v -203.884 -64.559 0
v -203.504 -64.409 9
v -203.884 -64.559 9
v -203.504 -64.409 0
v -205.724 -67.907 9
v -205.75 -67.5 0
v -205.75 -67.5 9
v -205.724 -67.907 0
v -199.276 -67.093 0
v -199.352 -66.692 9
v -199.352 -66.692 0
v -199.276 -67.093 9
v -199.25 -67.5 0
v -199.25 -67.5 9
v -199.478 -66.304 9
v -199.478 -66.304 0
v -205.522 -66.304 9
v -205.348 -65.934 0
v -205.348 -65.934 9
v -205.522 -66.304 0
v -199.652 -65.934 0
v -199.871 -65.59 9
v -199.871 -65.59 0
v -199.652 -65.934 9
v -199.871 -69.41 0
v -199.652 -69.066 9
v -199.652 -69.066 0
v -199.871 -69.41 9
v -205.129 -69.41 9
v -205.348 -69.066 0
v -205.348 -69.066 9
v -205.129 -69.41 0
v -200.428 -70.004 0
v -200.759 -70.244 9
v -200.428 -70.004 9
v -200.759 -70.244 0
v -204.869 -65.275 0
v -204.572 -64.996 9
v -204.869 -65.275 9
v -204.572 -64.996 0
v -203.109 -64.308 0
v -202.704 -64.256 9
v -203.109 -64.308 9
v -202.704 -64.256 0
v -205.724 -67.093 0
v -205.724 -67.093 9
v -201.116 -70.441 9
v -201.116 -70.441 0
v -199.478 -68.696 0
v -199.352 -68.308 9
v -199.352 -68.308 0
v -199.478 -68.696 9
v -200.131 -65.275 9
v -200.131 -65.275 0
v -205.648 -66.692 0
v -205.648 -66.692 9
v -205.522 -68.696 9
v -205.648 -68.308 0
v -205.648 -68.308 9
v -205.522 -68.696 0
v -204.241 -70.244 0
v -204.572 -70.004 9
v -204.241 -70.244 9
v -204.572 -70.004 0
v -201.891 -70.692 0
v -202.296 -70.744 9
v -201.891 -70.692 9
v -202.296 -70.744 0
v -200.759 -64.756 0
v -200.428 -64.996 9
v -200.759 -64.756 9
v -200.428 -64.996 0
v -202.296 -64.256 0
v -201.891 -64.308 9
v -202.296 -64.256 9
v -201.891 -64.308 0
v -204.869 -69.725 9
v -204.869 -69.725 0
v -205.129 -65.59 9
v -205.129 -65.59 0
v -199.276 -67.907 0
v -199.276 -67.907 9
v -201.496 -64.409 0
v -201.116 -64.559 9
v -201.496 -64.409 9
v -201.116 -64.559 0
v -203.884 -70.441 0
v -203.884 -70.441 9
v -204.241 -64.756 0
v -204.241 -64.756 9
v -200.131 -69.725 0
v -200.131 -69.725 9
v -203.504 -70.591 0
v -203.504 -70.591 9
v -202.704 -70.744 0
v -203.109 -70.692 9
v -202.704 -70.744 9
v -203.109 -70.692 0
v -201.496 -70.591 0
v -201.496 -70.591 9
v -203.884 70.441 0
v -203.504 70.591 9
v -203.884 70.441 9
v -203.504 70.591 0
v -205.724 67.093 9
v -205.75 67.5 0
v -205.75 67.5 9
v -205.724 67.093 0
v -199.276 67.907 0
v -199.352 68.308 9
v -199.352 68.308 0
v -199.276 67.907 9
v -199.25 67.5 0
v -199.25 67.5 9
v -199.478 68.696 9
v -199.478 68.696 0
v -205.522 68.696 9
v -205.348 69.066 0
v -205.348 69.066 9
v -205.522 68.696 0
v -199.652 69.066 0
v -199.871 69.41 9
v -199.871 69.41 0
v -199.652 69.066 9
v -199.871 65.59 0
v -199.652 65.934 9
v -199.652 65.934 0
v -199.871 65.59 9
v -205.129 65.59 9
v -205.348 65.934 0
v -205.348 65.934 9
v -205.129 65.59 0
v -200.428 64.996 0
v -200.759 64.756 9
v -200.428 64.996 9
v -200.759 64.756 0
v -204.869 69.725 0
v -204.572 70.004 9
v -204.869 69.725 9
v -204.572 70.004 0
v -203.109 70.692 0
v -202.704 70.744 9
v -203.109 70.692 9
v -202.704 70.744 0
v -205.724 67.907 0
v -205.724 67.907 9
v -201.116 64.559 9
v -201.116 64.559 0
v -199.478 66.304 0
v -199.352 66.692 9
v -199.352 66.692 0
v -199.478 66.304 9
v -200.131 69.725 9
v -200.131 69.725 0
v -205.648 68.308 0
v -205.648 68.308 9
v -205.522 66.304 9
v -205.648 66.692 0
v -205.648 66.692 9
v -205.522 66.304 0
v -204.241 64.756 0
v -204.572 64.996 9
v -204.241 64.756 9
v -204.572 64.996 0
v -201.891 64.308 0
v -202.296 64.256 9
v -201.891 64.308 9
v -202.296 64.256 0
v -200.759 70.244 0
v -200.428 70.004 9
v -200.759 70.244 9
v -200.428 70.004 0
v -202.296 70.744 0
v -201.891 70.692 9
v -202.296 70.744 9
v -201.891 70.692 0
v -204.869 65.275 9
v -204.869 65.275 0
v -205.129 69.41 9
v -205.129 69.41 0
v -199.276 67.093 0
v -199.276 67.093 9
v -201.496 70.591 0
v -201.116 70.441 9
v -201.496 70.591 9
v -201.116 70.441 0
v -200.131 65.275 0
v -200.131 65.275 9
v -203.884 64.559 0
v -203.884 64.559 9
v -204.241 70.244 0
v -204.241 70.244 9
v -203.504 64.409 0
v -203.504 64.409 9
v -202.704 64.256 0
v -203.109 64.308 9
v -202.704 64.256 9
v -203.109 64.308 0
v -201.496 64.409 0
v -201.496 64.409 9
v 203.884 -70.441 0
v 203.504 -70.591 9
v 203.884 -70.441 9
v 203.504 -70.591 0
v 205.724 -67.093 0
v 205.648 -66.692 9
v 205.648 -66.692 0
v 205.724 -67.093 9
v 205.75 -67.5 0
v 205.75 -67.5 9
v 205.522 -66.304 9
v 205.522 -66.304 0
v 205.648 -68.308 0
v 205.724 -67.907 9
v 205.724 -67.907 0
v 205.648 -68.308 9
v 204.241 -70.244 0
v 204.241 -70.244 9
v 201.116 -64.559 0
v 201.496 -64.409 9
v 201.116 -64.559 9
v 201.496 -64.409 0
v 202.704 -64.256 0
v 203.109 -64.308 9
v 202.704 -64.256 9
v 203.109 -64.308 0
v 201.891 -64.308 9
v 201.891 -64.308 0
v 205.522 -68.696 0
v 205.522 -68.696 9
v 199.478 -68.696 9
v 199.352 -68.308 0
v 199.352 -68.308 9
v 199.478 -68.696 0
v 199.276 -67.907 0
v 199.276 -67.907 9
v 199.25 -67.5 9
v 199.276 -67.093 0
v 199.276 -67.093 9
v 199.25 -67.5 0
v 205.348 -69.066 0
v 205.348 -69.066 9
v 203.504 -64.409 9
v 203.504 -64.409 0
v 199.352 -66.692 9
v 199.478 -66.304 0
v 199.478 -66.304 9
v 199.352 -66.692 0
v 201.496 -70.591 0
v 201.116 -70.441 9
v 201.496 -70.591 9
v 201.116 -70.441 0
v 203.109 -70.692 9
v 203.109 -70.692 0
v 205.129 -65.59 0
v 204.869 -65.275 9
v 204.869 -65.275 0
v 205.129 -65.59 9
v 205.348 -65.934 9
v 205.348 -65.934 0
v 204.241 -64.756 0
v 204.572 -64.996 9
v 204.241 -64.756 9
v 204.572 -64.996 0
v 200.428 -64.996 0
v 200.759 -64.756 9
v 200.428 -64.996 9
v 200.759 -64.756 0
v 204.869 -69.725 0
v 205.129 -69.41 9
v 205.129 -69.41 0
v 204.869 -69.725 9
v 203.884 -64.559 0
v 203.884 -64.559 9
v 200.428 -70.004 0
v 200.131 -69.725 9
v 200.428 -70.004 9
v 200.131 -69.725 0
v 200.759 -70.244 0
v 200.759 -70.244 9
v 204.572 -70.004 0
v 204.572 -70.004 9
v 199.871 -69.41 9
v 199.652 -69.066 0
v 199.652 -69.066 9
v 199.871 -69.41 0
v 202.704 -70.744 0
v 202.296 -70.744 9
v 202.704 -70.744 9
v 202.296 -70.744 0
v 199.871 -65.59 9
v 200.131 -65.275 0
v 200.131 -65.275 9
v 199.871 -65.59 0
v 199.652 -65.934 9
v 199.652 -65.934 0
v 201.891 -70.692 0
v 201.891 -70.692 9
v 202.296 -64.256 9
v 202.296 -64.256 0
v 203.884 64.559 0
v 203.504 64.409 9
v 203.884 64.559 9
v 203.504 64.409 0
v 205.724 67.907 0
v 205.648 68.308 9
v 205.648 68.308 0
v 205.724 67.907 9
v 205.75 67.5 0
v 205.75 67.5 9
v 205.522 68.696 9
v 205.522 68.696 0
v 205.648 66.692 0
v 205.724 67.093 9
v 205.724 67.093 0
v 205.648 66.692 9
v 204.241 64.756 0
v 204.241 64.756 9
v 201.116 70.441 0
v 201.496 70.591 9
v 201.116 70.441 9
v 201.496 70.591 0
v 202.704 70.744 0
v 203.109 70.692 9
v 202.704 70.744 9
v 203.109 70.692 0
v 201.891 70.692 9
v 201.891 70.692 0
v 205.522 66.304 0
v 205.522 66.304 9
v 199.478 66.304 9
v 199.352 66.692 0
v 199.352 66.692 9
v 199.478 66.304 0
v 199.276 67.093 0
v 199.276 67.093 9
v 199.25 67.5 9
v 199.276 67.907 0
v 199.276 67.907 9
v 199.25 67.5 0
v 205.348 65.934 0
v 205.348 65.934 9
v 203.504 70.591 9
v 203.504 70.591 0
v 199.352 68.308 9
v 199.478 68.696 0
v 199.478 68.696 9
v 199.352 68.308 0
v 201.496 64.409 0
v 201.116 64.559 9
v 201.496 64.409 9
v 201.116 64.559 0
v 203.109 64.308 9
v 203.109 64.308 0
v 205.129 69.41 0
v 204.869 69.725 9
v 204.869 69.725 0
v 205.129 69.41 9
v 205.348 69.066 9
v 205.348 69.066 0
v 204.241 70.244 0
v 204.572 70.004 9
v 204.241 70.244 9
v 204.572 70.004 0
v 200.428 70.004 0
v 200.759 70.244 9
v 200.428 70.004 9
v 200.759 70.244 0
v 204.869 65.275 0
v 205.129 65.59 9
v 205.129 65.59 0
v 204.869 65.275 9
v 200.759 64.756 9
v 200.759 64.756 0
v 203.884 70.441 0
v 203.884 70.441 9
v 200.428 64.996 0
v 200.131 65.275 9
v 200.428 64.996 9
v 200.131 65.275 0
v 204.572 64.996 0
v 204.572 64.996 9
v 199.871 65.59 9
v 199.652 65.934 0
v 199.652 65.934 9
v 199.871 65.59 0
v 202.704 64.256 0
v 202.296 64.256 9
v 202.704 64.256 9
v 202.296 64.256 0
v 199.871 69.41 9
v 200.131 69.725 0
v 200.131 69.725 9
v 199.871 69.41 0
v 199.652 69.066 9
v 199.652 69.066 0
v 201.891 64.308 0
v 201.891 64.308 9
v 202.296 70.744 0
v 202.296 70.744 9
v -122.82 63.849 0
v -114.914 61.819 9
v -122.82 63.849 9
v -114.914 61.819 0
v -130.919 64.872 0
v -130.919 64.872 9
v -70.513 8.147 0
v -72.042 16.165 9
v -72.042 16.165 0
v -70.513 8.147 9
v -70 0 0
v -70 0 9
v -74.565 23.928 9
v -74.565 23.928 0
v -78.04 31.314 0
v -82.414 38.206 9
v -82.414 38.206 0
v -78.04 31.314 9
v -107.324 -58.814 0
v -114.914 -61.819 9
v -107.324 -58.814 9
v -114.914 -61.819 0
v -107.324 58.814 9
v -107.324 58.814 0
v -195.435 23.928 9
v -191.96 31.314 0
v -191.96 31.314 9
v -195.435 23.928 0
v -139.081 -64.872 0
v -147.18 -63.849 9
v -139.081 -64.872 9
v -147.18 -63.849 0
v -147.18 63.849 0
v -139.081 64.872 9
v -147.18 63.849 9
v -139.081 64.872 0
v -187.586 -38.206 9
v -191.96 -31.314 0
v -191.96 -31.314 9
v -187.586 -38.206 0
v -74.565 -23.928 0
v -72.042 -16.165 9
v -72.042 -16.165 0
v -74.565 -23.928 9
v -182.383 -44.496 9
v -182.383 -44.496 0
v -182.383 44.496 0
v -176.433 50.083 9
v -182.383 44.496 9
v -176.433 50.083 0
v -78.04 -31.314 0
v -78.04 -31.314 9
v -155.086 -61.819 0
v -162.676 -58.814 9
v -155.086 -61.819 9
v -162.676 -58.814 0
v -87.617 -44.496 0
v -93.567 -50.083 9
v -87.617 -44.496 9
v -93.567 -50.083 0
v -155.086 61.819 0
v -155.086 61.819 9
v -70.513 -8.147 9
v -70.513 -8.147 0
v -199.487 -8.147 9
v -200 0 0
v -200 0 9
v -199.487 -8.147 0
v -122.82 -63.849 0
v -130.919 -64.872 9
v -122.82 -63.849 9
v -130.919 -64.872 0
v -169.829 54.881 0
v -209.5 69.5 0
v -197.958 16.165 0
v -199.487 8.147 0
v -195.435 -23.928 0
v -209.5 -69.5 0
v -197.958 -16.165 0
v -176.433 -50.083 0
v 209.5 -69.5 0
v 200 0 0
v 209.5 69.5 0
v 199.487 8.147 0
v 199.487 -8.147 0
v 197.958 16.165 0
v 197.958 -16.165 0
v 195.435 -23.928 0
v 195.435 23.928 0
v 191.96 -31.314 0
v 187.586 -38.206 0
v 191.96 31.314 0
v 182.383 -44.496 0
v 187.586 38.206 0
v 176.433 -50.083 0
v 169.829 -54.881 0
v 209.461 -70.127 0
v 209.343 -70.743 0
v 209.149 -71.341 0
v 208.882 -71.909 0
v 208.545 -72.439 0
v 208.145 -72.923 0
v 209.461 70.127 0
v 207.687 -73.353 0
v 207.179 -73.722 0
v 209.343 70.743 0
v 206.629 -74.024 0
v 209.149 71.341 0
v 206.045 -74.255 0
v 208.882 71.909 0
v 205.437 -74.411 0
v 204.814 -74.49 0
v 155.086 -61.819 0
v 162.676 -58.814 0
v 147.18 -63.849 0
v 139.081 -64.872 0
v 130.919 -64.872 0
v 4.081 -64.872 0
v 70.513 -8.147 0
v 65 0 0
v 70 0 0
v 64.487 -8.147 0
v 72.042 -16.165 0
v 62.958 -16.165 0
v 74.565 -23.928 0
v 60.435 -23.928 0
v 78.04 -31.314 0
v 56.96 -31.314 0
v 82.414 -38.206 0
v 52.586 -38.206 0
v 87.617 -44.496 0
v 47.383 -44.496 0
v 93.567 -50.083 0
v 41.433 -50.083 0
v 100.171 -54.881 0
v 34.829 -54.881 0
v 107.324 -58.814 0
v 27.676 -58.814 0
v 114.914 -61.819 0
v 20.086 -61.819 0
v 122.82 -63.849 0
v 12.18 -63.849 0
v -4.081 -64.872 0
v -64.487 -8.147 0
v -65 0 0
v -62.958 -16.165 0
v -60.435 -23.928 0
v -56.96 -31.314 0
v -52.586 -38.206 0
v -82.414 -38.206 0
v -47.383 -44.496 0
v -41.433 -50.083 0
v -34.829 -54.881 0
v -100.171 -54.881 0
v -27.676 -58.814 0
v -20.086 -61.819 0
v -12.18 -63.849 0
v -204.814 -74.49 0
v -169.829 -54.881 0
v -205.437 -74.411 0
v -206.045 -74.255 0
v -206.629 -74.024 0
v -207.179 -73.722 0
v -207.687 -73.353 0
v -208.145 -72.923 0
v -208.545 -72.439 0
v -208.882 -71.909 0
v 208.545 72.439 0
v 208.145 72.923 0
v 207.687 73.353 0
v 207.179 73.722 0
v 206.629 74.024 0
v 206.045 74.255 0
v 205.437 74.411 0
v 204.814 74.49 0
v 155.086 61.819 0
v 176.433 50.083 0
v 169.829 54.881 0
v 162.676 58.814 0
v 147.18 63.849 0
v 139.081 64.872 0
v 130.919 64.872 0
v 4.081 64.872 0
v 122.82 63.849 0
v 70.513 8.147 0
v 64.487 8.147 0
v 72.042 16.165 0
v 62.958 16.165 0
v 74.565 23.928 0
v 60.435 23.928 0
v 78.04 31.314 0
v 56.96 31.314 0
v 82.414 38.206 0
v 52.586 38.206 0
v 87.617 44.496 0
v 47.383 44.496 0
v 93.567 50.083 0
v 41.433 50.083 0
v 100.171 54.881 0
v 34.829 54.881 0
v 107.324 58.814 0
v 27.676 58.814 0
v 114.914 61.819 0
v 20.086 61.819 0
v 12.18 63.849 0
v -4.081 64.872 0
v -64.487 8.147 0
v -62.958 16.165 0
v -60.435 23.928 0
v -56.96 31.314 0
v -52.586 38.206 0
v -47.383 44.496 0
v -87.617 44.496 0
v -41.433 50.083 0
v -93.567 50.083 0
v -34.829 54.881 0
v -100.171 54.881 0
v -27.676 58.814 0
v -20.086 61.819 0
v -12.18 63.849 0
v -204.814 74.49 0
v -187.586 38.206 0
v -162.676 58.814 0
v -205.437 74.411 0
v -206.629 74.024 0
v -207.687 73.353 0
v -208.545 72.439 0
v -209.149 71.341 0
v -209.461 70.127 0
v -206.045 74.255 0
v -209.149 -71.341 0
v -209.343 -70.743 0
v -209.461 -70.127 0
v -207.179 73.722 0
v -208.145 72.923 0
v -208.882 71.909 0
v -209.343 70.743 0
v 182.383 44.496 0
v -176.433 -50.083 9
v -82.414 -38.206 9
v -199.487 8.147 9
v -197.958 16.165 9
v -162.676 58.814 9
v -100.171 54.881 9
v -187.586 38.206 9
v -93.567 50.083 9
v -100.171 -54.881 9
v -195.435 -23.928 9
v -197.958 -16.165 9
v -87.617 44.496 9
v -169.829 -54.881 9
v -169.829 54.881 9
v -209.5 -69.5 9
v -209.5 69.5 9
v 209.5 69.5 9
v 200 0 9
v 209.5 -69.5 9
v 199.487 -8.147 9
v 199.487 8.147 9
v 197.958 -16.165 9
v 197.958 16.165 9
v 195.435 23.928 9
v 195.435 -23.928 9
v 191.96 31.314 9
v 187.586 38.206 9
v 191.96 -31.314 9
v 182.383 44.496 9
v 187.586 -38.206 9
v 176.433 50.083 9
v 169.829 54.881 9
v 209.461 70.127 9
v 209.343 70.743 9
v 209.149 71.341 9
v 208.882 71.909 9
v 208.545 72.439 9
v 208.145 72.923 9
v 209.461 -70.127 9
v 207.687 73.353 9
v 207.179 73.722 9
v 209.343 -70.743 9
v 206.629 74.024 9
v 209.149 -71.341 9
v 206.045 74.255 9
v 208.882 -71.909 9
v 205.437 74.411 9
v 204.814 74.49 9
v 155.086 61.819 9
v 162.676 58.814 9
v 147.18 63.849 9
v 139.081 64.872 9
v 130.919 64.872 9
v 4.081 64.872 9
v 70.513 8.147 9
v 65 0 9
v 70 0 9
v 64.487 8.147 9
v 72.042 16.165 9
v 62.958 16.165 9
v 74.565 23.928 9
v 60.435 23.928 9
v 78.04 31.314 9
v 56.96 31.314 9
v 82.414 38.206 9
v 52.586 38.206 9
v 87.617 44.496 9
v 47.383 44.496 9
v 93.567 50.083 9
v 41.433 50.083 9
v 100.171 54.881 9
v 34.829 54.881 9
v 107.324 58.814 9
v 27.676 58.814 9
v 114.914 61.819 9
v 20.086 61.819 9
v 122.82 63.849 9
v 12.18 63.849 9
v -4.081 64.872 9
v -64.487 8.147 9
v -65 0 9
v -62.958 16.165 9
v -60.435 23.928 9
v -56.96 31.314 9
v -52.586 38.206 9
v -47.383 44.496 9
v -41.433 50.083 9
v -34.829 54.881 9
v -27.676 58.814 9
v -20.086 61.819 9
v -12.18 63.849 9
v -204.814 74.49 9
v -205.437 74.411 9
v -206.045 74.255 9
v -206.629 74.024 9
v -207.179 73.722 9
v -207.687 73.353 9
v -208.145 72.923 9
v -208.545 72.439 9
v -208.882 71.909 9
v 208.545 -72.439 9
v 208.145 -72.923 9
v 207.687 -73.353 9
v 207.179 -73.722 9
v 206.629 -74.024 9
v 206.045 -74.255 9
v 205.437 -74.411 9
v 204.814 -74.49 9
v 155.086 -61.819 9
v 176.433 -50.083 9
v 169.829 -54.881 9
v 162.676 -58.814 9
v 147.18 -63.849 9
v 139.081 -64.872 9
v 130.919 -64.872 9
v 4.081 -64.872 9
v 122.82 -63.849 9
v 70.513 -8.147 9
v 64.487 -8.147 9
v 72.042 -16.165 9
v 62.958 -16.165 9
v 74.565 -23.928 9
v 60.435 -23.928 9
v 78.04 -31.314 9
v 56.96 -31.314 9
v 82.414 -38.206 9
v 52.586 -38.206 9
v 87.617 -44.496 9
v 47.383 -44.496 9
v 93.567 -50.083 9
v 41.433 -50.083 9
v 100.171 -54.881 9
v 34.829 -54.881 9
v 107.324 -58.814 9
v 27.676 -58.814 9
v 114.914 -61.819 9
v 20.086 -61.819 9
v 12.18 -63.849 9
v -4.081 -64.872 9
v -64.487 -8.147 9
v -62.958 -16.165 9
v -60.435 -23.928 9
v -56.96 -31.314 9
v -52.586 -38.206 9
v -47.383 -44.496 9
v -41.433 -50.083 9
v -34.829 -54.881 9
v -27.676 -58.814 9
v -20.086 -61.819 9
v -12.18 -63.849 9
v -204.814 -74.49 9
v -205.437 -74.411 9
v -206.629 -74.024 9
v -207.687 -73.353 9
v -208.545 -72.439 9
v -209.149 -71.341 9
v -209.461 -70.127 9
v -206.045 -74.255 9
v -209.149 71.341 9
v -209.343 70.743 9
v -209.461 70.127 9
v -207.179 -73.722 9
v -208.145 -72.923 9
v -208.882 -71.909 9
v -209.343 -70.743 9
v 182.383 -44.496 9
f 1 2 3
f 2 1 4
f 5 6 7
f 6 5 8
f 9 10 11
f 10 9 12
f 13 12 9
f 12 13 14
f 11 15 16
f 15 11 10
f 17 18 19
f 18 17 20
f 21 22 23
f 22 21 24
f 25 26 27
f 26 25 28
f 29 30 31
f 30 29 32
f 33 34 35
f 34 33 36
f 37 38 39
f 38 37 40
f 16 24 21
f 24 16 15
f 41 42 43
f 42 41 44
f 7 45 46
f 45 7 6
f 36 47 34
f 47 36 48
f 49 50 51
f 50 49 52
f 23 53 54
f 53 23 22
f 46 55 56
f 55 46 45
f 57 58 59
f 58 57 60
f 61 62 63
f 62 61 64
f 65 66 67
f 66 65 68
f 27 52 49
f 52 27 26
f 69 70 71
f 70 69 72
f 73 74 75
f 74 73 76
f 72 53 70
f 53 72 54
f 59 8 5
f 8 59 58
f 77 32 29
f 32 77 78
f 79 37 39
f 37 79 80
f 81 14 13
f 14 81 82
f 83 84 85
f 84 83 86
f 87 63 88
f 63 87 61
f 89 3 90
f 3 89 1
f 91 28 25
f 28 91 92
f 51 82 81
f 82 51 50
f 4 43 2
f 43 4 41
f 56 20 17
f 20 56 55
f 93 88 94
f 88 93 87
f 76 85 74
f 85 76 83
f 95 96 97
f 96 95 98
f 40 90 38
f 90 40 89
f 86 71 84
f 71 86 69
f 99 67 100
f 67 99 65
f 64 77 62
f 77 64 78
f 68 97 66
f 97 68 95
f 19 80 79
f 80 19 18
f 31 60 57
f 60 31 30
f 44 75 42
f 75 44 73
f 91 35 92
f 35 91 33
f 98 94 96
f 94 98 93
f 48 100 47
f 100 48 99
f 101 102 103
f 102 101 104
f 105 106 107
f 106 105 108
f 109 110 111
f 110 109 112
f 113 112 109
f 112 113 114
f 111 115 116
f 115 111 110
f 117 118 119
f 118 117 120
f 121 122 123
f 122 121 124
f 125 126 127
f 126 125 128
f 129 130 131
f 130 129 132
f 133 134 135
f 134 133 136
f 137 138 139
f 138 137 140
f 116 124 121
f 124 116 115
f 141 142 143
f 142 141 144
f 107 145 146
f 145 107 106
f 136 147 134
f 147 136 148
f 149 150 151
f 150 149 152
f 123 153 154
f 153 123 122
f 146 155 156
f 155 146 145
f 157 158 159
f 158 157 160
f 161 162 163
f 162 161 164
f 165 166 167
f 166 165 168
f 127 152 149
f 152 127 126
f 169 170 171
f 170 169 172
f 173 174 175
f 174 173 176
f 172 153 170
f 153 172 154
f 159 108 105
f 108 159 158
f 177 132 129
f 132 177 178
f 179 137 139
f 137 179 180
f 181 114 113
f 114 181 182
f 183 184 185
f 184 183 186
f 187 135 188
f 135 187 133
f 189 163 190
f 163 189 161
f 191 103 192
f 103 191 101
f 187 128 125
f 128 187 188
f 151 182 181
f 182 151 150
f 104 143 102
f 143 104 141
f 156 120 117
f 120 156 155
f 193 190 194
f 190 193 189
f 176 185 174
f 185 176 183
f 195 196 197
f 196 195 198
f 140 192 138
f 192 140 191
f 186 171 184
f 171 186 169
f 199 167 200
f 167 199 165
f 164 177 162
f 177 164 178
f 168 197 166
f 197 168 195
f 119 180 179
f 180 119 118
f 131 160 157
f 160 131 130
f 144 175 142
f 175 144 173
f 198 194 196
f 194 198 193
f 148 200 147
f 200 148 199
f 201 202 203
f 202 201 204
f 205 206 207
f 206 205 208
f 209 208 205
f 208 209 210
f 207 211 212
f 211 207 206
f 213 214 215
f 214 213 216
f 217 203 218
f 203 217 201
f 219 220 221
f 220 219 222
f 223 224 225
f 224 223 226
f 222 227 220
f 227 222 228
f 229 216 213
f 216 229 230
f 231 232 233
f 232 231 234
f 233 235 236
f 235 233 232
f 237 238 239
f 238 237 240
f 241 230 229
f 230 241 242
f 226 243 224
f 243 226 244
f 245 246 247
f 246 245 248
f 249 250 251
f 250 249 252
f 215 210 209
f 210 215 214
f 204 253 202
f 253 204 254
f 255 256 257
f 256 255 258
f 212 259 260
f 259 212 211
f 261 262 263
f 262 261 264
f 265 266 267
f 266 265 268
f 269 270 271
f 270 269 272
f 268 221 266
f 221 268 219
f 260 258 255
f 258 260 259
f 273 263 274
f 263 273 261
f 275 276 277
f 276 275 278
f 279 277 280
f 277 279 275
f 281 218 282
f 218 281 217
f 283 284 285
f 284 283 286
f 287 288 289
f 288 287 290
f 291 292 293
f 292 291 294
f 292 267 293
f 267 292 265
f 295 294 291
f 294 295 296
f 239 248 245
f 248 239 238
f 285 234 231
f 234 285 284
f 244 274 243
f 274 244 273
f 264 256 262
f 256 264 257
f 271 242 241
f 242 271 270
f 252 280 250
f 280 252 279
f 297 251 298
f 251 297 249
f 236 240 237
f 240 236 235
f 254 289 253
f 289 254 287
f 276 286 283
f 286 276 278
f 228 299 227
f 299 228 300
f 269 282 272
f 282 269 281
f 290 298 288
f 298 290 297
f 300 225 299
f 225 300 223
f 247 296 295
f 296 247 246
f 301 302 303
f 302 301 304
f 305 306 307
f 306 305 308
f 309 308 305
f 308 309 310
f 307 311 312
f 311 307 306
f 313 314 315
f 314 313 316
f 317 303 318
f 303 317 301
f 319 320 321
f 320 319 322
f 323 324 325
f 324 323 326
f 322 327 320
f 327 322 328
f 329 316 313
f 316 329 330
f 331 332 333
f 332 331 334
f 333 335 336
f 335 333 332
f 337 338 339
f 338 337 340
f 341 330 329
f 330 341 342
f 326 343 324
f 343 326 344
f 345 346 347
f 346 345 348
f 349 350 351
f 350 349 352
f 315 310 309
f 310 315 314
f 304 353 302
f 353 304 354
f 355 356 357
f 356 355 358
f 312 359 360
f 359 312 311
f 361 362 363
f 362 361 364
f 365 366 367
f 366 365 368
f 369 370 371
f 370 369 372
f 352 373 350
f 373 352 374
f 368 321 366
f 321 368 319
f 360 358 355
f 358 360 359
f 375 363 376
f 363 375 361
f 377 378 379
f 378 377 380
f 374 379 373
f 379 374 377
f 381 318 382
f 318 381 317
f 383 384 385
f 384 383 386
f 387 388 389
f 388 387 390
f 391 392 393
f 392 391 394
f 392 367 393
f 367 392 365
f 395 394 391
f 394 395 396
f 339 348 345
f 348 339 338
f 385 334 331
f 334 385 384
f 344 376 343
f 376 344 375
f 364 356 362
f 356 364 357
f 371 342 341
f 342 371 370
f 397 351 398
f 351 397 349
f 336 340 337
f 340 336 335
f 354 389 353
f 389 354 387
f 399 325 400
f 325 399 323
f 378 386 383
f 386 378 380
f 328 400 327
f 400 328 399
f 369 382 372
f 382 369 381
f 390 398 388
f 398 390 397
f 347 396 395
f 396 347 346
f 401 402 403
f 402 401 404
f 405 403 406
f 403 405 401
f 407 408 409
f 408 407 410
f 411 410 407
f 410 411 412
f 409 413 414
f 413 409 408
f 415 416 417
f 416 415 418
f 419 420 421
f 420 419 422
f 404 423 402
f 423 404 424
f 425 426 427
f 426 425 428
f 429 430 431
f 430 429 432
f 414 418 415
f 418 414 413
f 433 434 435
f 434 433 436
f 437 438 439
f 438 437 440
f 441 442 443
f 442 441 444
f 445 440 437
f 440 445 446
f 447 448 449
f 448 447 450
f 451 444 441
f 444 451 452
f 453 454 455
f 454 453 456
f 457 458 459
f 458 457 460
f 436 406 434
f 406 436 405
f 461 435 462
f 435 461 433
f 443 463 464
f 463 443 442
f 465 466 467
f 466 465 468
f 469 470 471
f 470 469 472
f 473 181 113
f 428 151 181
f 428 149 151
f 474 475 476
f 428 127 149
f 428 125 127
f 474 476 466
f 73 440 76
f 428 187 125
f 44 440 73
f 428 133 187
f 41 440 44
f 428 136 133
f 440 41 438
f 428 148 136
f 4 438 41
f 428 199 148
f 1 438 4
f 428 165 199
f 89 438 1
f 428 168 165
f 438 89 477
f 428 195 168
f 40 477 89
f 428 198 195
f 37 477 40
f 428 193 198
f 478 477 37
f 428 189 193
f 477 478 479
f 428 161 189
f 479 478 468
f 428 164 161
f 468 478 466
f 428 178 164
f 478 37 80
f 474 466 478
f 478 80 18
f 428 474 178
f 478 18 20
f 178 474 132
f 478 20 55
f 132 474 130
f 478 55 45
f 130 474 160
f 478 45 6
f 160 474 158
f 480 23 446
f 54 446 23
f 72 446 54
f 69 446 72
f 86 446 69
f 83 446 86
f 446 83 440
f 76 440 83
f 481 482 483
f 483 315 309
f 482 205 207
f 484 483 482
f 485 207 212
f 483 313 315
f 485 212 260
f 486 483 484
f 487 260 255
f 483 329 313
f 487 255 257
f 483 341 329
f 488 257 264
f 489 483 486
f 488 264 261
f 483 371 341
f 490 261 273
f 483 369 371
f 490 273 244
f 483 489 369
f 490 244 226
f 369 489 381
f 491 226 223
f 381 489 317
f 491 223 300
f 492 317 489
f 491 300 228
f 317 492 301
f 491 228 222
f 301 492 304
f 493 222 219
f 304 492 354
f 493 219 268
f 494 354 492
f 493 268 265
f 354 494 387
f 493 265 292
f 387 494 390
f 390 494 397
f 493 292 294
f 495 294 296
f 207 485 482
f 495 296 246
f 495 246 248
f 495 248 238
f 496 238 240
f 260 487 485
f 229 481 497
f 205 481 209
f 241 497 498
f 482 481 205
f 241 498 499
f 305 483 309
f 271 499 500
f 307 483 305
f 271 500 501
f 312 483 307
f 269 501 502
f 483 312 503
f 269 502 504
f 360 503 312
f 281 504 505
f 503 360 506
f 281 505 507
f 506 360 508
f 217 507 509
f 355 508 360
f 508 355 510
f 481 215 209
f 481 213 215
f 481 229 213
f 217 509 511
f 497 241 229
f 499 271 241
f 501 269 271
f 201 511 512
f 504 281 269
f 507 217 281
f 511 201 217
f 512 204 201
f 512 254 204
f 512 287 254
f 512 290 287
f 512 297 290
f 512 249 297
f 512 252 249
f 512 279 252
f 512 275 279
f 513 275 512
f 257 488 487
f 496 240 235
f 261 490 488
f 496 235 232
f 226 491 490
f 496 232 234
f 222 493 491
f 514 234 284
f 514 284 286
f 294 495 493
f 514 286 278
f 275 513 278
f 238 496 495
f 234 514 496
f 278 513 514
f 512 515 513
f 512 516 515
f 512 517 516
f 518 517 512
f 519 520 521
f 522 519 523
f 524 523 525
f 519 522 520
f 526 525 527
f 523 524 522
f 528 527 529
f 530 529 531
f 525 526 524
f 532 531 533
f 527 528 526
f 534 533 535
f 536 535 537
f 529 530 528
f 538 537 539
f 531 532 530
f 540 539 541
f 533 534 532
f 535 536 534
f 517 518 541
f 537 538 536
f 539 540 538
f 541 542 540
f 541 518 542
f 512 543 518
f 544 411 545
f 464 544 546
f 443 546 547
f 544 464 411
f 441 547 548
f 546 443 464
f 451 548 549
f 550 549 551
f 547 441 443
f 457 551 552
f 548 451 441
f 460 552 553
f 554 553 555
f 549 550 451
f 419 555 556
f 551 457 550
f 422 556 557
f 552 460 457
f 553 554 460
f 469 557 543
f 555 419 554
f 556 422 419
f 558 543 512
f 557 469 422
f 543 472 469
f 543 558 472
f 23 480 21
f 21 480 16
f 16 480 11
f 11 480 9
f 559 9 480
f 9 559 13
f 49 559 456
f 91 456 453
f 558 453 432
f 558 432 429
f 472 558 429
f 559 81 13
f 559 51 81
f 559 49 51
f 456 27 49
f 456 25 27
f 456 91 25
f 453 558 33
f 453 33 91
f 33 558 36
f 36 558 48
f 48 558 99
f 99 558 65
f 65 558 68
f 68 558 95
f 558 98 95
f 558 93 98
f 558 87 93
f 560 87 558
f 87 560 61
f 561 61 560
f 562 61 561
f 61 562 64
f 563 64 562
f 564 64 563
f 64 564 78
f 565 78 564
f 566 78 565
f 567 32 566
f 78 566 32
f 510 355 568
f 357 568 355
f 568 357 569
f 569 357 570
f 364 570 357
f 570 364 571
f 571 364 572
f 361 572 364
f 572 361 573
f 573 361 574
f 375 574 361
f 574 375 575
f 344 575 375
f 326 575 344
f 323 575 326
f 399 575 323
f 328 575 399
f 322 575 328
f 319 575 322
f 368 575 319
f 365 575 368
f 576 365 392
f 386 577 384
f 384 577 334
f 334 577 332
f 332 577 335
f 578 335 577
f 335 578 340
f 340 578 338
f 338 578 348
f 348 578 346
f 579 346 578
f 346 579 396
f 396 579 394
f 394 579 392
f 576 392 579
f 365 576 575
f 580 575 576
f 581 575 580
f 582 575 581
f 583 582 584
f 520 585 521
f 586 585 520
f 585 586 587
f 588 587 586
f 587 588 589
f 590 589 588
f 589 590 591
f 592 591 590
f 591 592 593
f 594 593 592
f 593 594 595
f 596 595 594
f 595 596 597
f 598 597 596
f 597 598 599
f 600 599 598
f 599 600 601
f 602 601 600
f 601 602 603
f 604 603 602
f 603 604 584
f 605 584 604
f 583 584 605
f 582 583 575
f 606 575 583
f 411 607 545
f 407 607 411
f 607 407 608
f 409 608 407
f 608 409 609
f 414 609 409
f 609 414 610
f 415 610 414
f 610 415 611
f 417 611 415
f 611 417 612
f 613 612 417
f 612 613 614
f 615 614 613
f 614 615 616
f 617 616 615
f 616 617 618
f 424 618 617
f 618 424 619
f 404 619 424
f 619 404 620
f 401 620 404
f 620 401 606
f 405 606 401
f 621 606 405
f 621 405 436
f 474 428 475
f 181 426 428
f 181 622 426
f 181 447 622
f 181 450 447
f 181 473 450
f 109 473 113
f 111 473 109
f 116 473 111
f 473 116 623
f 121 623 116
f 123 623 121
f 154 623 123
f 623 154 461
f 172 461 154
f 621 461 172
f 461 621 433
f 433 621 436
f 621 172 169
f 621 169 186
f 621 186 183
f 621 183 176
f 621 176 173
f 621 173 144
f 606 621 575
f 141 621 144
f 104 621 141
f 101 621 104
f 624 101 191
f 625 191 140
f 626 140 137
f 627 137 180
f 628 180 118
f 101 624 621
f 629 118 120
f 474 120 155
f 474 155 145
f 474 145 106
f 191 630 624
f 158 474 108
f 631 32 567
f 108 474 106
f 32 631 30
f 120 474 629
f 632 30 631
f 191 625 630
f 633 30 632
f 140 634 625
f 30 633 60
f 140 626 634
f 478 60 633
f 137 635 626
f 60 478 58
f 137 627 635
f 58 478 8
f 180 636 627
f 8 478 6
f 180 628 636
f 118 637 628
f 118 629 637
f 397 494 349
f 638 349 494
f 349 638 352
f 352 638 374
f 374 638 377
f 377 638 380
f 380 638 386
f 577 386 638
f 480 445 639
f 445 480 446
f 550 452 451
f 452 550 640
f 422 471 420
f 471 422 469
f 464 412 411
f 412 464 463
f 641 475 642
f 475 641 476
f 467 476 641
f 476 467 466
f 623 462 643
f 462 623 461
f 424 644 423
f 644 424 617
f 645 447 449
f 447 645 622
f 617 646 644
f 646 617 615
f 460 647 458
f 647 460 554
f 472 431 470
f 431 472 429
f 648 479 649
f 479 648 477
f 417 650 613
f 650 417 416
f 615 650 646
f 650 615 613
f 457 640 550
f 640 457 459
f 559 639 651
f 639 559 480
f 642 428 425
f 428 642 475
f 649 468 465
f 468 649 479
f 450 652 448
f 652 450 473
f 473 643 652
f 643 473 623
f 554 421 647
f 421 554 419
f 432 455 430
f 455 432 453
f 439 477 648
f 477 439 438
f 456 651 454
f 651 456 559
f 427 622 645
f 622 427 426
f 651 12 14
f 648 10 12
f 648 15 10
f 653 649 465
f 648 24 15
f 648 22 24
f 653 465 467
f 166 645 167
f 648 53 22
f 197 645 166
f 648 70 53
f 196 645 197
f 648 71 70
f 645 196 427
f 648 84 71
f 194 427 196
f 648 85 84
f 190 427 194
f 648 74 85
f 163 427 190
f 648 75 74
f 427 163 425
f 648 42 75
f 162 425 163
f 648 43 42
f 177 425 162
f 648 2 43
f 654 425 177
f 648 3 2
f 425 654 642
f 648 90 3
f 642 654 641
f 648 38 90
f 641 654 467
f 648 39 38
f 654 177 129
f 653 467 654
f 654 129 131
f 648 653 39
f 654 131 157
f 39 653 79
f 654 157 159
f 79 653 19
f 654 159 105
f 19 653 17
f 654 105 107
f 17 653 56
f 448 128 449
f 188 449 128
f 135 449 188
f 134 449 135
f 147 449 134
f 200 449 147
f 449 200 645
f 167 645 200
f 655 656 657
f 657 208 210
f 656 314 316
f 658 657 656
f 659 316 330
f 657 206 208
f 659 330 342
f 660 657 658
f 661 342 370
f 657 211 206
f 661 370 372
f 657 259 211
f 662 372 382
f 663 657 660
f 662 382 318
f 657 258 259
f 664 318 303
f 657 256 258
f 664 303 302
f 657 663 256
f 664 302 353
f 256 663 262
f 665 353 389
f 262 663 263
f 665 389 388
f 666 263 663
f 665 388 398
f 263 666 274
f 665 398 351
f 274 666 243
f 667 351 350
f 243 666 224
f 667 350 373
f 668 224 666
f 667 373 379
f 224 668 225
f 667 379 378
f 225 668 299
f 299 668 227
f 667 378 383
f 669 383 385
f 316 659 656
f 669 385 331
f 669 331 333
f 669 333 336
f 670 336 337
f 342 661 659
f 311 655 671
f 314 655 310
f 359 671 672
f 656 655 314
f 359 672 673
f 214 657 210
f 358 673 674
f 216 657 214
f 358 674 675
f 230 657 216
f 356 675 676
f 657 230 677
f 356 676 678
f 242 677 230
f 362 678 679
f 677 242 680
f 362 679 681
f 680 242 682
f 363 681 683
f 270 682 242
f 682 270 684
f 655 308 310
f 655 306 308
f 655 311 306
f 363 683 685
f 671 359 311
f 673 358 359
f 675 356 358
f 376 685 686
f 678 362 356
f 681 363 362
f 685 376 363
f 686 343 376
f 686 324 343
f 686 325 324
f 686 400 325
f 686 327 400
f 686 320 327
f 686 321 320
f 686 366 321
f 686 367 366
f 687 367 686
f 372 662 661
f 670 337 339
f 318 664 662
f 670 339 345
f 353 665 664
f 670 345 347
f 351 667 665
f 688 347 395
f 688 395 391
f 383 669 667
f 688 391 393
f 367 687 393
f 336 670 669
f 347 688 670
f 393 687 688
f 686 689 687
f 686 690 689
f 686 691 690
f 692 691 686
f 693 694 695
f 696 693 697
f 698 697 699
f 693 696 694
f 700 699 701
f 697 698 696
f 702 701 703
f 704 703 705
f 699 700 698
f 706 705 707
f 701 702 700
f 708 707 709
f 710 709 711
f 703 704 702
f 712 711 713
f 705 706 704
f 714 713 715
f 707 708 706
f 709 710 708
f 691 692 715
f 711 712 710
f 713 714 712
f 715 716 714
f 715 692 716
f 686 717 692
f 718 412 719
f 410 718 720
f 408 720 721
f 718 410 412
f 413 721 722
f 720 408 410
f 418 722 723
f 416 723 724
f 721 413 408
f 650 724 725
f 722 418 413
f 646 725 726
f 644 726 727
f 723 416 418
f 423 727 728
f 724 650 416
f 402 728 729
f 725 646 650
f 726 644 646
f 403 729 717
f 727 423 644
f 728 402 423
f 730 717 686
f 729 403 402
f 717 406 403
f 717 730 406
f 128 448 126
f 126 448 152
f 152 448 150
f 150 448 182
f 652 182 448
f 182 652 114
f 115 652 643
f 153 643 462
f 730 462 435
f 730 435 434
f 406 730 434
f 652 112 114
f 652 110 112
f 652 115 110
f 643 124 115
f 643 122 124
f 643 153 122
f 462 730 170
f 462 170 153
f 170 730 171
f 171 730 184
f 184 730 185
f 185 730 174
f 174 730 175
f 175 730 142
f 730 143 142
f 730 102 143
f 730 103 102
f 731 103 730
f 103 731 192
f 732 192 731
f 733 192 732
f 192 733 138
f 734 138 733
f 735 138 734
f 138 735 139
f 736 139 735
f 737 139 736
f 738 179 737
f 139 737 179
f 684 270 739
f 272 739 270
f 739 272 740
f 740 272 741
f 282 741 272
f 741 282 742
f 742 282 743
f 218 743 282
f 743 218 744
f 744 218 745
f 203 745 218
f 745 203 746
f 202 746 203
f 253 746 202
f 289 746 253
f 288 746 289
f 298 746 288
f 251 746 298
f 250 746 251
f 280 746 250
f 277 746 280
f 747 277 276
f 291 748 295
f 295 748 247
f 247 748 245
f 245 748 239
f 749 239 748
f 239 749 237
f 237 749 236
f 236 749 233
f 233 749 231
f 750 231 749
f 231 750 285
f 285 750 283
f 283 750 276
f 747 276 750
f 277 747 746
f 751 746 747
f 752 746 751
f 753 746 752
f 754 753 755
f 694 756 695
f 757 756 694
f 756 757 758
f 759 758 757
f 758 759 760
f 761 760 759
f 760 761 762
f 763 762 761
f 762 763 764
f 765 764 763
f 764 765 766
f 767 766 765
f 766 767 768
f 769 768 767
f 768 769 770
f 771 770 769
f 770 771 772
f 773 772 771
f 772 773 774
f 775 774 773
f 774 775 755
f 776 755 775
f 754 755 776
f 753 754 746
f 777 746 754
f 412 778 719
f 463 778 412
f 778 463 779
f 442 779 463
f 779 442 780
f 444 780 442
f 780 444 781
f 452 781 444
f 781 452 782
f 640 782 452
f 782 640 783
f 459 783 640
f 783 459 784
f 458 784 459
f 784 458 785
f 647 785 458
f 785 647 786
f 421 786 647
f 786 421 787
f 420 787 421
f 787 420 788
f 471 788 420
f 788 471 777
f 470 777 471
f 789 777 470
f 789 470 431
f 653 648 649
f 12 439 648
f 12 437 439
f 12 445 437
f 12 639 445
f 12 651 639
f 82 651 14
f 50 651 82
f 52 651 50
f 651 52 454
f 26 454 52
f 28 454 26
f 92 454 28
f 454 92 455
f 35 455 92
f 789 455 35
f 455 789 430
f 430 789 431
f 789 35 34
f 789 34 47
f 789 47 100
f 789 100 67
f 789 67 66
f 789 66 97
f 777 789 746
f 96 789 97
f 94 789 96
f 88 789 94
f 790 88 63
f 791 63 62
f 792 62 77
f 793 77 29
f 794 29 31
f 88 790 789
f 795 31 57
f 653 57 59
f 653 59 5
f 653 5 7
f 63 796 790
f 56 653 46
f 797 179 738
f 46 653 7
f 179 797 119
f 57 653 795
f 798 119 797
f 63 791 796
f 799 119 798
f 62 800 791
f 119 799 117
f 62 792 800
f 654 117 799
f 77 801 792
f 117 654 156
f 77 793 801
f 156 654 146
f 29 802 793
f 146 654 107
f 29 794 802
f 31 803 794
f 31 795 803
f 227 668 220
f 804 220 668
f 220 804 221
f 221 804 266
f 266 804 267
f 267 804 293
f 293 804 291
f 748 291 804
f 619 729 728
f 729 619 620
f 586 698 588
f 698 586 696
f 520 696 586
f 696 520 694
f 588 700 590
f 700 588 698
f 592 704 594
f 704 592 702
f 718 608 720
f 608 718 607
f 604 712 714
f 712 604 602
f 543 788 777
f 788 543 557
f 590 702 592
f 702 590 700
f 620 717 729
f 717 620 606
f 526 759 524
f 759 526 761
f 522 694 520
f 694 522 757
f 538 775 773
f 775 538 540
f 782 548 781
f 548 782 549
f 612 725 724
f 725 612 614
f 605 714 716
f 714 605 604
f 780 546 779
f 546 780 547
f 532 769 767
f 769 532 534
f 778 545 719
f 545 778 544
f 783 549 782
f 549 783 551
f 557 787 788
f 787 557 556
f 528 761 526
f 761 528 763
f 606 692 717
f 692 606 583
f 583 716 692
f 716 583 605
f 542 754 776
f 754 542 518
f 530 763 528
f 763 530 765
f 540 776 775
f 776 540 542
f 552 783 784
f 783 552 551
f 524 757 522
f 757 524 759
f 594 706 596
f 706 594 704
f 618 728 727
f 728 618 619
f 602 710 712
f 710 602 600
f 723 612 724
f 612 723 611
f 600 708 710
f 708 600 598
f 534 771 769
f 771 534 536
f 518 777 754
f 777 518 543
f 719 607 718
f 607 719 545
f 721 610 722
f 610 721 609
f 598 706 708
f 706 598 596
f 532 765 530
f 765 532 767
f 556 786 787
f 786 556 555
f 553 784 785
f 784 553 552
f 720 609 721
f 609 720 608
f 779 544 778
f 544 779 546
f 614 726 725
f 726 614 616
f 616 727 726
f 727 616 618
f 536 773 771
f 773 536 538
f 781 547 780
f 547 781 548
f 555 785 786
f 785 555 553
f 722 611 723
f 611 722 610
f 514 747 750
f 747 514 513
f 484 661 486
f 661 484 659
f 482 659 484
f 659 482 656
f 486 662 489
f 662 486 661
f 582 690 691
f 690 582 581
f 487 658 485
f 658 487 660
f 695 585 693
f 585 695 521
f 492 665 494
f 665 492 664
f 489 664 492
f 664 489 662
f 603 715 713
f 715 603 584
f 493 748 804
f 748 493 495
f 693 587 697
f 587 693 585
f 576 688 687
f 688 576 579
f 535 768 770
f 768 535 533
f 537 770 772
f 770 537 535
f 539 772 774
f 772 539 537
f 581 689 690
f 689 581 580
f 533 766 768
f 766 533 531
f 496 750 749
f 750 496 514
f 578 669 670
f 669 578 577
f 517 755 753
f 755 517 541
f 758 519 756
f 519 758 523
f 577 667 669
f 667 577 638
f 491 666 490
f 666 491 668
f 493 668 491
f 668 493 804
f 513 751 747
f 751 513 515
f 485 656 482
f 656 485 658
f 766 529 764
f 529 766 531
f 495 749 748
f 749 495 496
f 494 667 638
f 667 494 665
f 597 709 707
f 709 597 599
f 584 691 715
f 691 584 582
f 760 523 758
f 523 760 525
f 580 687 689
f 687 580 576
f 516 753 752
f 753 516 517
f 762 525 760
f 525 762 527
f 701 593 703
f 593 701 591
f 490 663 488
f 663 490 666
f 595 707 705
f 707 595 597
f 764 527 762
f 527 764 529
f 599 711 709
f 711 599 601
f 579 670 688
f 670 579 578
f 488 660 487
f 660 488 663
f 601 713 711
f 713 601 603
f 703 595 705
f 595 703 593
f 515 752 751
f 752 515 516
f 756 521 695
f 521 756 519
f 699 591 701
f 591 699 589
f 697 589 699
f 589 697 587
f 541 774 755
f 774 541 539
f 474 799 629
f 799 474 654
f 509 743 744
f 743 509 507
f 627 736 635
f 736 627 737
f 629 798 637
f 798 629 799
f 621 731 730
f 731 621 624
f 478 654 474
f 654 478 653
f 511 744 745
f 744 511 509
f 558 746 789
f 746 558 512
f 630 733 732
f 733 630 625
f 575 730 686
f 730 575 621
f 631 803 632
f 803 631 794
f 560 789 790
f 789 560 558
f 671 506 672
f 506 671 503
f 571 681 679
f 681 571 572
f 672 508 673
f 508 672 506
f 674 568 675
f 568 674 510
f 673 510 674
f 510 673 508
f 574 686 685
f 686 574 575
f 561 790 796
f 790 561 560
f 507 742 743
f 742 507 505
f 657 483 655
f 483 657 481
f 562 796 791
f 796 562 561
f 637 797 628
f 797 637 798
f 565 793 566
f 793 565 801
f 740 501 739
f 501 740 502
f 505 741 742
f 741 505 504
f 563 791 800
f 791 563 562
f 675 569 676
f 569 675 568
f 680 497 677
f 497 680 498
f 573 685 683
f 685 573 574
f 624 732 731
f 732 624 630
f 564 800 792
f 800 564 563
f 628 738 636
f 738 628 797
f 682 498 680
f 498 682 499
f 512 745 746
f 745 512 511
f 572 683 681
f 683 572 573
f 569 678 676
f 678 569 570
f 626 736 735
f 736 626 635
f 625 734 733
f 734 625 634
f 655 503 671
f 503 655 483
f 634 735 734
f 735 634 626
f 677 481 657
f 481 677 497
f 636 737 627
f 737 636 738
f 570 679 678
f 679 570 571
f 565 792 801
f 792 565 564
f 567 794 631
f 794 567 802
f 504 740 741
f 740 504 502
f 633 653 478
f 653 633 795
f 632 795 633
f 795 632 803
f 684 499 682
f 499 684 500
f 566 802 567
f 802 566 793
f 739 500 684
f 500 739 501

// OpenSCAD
$fn = 50;


difference() {
	union() {
		hull() {
			translate(v = [-204.5000000000, 69.5000000000, 0]) {
				cylinder(h = 9, r = 5);
			}
			translate(v = [204.5000000000, 69.5000000000, 0]) {
				cylinder(h = 9, r = 5);
			}
			translate(v = [-204.5000000000, -69.5000000000, 0]) {
				cylinder(h = 9, r = 5);
			}
			translate(v = [204.5000000000, -69.5000000000, 0]) {
				cylinder(h = 9, r = 5);
			}
		}
	}
	union() {
		#translate(v = [-202.5000000000, -67.5000000000, -100.0000000000]) {
			cylinder(h = 200, r = 3.2500000000);
		}
		#translate(v = [-202.5000000000, 67.5000000000, -100.0000000000]) {
			cylinder(h = 200, r = 3.2500000000);
		}
		#translate(v = [202.5000000000, -67.5000000000, -100.0000000000]) {
			cylinder(h = 200, r = 3.2500000000);
		}
		#translate(v = [202.5000000000, 67.5000000000, -100.0000000000]) {
			cylinder(h = 200, r = 3.2500000000);
		}
		#translate(v = [-135.0000000000, 0, 0]) {
			cylinder(h = 9, r = 65.0000000000);
		}
		#cylinder(h = 9, r = 65.0000000000);
		#translate(v = [135.0000000000, 0, 0]) {
			cylinder(h = 9, r = 65.0000000000);
		}
	}
}
